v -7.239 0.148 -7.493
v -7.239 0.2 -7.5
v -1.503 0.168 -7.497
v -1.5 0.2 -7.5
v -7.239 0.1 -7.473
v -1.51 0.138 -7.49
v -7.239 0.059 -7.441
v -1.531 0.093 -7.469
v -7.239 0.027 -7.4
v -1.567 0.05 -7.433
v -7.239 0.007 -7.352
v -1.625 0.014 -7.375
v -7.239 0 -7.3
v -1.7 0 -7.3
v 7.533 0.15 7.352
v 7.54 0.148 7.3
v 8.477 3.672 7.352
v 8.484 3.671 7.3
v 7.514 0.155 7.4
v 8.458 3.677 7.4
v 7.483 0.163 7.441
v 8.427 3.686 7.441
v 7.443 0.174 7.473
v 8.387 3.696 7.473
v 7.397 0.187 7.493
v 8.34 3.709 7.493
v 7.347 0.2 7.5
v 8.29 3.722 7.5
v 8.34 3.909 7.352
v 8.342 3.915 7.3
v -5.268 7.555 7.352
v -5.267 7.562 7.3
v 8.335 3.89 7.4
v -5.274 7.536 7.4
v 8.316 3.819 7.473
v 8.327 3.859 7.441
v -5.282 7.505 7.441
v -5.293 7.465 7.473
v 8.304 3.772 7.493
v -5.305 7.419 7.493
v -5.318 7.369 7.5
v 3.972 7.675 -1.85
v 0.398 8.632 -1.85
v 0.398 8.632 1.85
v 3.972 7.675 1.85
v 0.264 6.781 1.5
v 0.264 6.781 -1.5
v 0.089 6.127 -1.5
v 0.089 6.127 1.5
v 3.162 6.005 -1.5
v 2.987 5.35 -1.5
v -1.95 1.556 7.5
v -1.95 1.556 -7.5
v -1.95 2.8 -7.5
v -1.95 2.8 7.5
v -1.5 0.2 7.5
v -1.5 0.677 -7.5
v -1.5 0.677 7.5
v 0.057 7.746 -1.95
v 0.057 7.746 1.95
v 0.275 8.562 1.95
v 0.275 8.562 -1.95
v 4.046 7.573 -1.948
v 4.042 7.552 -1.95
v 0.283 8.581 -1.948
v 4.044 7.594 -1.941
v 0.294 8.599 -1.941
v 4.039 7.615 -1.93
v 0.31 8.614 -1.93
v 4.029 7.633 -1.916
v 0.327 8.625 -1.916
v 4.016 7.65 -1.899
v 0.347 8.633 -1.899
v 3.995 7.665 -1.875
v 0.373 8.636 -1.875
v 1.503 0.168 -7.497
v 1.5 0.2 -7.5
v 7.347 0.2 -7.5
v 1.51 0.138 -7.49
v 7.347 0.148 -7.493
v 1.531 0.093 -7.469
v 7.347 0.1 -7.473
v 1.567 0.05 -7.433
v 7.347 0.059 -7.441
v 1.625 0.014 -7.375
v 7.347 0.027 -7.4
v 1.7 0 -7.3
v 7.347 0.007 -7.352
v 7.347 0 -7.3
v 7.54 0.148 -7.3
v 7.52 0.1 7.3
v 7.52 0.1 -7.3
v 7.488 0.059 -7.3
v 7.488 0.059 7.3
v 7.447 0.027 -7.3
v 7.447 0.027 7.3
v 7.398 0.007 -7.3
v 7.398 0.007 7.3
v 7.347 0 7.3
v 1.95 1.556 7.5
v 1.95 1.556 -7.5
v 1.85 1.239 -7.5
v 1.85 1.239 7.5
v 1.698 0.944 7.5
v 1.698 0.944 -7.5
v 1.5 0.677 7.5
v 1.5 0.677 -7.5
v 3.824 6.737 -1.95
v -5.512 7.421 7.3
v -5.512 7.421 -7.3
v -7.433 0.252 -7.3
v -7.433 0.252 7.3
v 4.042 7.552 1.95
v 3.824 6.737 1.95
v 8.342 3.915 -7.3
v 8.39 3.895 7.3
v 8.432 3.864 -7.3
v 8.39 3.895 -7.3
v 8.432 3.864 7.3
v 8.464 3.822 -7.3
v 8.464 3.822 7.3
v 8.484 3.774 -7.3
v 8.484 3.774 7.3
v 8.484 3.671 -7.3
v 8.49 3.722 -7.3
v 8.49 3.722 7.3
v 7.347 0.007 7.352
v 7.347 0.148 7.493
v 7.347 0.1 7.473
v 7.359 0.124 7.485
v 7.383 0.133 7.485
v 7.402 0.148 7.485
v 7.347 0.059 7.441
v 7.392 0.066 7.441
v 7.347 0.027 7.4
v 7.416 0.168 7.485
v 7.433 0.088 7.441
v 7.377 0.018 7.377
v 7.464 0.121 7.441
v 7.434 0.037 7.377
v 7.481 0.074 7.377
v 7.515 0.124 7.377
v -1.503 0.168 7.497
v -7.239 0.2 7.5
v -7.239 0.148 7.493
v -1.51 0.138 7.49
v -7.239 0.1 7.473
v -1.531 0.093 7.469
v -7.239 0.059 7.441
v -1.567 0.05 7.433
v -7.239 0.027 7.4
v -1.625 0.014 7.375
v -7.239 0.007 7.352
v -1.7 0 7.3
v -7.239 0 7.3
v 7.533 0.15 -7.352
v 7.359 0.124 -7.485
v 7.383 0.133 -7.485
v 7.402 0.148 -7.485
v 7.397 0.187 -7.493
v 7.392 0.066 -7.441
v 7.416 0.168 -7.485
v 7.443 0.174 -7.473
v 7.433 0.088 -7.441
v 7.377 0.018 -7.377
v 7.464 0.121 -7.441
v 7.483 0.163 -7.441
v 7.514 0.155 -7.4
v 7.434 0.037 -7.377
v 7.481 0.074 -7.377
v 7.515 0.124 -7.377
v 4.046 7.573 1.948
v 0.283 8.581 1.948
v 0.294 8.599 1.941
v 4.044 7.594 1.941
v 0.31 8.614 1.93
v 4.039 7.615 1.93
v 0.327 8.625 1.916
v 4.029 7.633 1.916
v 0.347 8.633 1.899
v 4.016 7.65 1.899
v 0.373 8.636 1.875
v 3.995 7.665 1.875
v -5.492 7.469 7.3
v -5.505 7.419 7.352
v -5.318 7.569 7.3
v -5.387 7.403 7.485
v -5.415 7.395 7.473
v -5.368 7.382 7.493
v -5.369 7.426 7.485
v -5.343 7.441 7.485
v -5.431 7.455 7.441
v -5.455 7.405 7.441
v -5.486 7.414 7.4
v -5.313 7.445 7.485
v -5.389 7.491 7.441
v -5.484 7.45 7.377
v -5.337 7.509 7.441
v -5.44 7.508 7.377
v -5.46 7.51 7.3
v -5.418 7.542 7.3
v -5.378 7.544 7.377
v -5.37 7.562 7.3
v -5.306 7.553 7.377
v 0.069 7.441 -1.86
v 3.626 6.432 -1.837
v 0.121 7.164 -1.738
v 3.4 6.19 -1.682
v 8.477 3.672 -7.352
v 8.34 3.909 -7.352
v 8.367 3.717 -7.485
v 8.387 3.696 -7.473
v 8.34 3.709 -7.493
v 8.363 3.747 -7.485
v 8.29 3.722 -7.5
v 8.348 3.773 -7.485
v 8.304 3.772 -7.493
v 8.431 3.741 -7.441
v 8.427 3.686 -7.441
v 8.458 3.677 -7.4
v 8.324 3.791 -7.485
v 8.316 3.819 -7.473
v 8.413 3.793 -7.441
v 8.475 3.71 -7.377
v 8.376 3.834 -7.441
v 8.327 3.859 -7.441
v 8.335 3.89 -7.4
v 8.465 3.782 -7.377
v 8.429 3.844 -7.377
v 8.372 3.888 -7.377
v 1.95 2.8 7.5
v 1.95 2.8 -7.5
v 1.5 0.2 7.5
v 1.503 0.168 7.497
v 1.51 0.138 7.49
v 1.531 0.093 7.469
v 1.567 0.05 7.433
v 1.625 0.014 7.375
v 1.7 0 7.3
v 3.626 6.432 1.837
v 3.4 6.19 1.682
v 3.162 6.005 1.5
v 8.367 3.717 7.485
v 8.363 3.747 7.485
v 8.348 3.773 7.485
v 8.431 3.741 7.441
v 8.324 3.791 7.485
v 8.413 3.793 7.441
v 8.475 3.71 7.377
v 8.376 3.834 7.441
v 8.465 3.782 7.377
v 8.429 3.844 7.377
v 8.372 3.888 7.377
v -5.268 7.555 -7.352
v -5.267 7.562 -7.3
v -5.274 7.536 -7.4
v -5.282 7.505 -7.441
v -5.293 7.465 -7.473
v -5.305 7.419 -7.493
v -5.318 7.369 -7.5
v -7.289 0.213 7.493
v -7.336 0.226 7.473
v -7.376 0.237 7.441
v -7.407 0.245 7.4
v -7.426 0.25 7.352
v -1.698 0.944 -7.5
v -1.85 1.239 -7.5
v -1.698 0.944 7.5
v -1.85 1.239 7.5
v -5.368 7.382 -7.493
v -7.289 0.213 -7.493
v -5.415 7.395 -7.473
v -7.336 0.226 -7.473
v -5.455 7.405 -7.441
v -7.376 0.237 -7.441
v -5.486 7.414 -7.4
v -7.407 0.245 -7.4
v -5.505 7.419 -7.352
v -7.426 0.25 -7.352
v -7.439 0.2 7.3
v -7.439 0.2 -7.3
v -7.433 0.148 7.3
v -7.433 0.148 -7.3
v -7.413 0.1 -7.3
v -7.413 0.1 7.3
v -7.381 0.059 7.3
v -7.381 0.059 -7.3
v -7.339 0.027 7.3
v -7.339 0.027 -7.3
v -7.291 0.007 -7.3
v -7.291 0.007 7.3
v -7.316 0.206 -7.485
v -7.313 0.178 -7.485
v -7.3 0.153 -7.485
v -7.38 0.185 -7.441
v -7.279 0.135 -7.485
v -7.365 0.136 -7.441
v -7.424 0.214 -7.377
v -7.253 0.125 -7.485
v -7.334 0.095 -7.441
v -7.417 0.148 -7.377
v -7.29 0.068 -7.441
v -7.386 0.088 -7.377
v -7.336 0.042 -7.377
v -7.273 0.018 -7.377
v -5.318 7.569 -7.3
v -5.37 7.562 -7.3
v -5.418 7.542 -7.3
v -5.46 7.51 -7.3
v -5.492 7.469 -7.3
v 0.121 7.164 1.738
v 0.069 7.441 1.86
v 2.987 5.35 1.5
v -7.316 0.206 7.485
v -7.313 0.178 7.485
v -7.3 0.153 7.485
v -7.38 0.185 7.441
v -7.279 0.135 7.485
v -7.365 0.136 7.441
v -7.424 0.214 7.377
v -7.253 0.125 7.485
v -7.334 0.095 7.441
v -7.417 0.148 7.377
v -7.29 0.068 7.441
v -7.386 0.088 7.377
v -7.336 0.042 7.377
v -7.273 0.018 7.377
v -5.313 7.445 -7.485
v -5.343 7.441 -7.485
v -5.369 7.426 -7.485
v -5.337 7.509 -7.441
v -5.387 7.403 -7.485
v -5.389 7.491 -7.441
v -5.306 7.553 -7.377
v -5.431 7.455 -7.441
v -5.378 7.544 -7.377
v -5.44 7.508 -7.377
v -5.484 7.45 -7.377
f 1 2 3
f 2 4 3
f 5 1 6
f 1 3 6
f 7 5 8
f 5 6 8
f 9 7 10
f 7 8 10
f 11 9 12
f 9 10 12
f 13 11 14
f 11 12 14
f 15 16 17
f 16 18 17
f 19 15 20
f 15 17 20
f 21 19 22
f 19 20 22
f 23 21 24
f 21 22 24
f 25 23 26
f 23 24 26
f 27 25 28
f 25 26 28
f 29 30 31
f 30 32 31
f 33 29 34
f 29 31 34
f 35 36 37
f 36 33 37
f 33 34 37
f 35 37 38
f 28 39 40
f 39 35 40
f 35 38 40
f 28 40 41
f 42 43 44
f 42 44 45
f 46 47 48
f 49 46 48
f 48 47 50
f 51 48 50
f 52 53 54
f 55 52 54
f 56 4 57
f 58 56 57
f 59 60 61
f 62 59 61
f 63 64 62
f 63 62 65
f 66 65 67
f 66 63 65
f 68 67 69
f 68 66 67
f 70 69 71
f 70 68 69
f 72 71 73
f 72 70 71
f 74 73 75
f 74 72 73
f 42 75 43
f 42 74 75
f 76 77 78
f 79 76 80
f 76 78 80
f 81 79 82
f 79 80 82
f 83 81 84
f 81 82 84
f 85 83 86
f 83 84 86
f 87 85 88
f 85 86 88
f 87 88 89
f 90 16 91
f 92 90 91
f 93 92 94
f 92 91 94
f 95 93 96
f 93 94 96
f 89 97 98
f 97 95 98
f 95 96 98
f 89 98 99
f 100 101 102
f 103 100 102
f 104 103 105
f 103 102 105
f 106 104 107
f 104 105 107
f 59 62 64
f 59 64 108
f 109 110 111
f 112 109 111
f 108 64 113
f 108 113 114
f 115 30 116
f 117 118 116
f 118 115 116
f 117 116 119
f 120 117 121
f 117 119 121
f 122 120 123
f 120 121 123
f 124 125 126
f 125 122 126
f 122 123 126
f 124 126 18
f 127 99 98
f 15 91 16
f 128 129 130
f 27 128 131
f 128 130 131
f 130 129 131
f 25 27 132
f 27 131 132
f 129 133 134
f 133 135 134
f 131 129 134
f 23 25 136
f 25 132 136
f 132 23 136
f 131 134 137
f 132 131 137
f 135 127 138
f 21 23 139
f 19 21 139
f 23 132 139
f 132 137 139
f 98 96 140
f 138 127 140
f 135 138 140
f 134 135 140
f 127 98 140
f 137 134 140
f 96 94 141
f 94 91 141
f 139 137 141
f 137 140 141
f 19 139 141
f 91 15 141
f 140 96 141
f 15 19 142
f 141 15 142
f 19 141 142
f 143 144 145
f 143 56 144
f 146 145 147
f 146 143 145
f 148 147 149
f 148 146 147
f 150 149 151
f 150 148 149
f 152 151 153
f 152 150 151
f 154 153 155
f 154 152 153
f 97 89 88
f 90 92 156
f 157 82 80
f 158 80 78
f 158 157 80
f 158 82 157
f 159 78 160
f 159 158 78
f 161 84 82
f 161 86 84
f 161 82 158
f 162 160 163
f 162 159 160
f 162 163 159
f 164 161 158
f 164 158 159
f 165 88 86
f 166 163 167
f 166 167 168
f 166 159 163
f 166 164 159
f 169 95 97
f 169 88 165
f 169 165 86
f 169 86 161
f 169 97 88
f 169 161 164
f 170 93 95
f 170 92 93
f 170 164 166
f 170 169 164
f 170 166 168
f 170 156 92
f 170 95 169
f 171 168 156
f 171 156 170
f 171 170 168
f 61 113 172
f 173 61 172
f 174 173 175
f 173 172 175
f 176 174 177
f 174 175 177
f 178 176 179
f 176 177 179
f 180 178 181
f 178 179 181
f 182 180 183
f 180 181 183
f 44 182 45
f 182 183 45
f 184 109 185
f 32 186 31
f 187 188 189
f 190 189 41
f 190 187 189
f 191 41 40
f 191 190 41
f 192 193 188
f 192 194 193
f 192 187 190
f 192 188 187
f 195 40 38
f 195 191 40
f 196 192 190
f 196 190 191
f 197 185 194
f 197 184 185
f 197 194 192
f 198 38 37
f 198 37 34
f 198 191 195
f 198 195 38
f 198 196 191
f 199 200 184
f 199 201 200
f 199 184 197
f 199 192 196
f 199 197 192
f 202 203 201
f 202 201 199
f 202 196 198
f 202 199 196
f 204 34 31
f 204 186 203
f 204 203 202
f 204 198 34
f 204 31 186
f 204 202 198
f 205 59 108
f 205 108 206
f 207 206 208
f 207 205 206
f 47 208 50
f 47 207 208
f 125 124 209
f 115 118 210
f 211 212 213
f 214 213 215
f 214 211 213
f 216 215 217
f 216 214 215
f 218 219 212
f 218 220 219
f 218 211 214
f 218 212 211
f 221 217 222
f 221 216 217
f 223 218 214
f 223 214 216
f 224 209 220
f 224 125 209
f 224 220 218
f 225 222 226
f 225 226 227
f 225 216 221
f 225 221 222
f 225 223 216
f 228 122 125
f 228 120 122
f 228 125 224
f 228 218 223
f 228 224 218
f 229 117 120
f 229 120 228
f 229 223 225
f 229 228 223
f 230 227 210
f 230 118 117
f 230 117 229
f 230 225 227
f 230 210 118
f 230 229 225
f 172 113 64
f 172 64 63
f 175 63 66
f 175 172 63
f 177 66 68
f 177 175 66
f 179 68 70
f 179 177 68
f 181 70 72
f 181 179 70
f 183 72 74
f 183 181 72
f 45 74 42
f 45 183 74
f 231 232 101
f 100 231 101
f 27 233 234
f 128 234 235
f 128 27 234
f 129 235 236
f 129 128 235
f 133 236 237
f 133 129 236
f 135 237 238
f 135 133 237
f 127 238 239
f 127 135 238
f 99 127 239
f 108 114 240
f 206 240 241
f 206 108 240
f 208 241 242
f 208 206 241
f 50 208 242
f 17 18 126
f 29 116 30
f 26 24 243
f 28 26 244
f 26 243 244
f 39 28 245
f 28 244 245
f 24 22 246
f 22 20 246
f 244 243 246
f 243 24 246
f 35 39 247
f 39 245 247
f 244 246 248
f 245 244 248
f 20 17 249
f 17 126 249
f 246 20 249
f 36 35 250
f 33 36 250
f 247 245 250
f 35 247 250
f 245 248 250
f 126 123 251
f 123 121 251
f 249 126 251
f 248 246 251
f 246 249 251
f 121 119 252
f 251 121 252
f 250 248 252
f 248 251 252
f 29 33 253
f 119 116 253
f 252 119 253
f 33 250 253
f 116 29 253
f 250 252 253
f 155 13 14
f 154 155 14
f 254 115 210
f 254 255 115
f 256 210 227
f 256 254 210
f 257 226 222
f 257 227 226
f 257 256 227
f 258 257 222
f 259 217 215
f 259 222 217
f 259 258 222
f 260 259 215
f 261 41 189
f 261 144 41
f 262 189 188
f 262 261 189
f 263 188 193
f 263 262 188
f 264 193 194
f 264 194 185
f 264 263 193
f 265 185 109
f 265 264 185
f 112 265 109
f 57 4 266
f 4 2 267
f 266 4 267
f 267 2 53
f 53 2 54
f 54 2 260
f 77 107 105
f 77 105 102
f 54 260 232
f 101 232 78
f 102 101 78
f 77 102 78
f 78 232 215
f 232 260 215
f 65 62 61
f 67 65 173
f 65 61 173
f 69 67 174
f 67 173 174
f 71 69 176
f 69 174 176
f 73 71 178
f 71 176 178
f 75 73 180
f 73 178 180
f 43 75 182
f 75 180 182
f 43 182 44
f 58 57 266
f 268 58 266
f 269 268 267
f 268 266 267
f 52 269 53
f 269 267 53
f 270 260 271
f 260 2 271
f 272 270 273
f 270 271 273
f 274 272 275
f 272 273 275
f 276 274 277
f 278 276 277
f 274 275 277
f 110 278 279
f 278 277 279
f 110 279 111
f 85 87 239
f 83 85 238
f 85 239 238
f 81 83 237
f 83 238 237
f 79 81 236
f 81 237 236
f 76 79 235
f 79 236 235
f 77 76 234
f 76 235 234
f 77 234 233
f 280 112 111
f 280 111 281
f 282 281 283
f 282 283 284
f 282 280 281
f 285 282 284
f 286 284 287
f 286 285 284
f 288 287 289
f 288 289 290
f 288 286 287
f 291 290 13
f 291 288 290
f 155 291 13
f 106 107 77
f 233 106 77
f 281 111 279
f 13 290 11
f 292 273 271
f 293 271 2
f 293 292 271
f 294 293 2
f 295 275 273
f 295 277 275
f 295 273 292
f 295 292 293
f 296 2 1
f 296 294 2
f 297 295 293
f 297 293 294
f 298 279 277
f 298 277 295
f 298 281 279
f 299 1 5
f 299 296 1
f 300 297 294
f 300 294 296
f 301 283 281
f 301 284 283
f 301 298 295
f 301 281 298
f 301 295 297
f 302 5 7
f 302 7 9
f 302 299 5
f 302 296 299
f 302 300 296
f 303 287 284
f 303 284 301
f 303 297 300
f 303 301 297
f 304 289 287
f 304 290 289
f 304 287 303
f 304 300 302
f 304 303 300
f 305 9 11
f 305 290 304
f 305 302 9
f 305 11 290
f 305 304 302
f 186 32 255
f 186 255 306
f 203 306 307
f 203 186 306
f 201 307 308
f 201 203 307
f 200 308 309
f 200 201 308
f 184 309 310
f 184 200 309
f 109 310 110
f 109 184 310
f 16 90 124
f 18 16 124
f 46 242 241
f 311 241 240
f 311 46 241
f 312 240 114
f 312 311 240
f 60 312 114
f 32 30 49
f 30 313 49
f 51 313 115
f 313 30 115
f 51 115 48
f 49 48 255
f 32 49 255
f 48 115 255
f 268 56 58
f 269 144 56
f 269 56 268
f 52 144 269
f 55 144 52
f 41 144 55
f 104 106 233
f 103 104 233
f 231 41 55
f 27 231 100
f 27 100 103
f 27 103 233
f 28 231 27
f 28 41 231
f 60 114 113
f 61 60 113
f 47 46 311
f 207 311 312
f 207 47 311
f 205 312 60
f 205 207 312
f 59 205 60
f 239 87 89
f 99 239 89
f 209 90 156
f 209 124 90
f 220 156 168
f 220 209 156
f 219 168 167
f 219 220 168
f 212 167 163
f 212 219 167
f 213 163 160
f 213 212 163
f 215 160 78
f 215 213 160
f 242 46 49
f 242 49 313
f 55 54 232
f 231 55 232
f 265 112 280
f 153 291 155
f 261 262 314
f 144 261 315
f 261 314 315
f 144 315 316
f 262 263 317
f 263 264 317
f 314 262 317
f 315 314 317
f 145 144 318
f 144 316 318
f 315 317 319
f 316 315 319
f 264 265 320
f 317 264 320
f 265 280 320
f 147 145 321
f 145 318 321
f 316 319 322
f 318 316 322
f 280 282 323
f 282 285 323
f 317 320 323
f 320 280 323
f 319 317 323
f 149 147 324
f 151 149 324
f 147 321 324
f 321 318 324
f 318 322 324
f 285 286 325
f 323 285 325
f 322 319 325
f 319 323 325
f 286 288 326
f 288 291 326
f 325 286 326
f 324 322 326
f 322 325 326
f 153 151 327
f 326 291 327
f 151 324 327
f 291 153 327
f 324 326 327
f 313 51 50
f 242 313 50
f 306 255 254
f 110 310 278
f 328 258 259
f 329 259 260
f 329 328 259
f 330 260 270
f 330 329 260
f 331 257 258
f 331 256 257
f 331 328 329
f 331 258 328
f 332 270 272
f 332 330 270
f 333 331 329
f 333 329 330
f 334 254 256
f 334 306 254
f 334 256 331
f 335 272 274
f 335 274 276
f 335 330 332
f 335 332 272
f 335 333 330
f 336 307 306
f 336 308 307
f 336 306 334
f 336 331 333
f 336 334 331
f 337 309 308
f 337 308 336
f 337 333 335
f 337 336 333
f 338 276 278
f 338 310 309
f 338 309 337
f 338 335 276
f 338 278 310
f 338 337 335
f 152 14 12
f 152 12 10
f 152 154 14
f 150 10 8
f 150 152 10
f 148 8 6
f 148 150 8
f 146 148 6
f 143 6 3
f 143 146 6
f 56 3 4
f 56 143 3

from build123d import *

# Parameters (mm, degrees)
EXTRUDE_1_DEPTH      = 7.5
EXTRUDE_1_DEPTH_BACK = 7.5
EXTRUDE_2_DEPTH      = 1.5
EXTRUDE_2_DEPTH_BACK = 1.5
EXTRUDE_3_DEPTH      = 2
EXTRUDE_3_DEPTH_BACK = 2
CUT_EXTRUDE_1_DEPTH  = 16.207955299
FILLET_1_R           = 0.2
FILLET_2_R           = 0.1


with BuildPart() as part:
    # 草图1 → 凸台-拉伸1 (new, two sides: drawn at the far end of the back side and taken through both)
    with BuildSketch(Plane.XY.offset(-EXTRUDE_1_DEPTH_BACK)):
        with BuildLine():
            Line((-7.5, 0), (-1.5, 0))
            Line((-1.5, 0), (-1.5, 0.677124344))
            ThreePointArc((-1.5, 0.677124344), (-1.780042303, 1.088161527), (-1.95, 1.555590279))
            Line((-1.95, 1.555590279), (-1.95, 2.8))
            Line((-1.95, 2.8), (1.95, 2.8))
            Line((1.95, 2.8), (1.95, 1.555590279))
            ThreePointArc((1.95, 1.555590279), (1.780042303, 1.088161527), (1.5, 0.677124344))
            Line((1.5, 0.677124344), (1.5, 0))
            Line((1.5, 0), (7.5, 0))
            Line((7.5, 0), (8.53527618, 3.863703305))
            Line((8.53527618, 3.863703305), (-5.459914348, 7.613703305))
            Line((-5.459914348, 7.613703305), (-7.5, 0))
        make_face()
    extrude(amount=EXTRUDE_1_DEPTH + EXTRUDE_1_DEPTH_BACK)

    # 草图2 → 凸台-拉伸2 (add, two sides: drawn at the far end of the back side and taken through both)
    with BuildSketch(Plane.XY.offset(-EXTRUDE_2_DEPTH_BACK)):
        Polygon((0.088792177, 6.126931873), (2.986569656, 5.350474738), (3.245388701, 6.316400564), (0.347611222, 7.092857699), align=None)
    extrude(amount=EXTRUDE_2_DEPTH + EXTRUDE_2_DEPTH_BACK)

    # 草图3 → 凸台-拉伸3 (add, two sides: drawn at the far end of the back side and taken through both)
    with BuildSketch(Plane.XY.offset(-EXTRUDE_3_DEPTH_BACK)):
        with BuildLine():
            Line((2.184728529, 8.153517871), (4.06828389, 7.648820733))
            Line((4.06828389, 7.648820733), (3.823852668, 6.736590993))
            ThreePointArc((3.823852668, 6.736590993), (3.538706676, 6.329077778), (3.161822332, 6.004526629))
            Line((3.161822332, 6.004526629), (0.264044853, 6.780983765))
            ThreePointArc((0.264044853, 6.780983765), (0.099929011, 7.250495477), (0.056741946, 7.745985269))
            Line((0.056741946, 7.745985269), (0.301173168, 8.658215009))
            Line((0.301173168, 8.658215009), (2.184728529, 8.153517871))
        make_face()
    extrude(amount=EXTRUDE_3_DEPTH + EXTRUDE_3_DEPTH_BACK)

    # 草图4 → 切除-拉伸1 (cut, through all)
    with BuildSketch(Plane(origin=(-1.883555361, 0.504697138, 0), x_dir=(0, 0, 1), z_dir=(-0.9659258262890692, 0.2588190451025178, 0))):
        with BuildLine():
            Line((1.95, 8.441142838), (2, 8.441142838))
            Line((2, 8.441142838), (2, 6.618267183))
            Line((2, 6.618267183), (1.5, 6.618267183))
            ThreePointArc((1.5, 6.618267183), (1.780042303, 7.029304366), (1.95, 7.496733117))
            Line((1.95, 7.496733117), (1.95, 8.441142838))
        make_face()
        with BuildLine():
            Line((-1.95, 8.441142838), (-1.95, 7.496733117))
            ThreePointArc((-1.95, 7.496733117), (-1.780042303, 7.029304366), (-1.5, 6.618267183))
            Line((-1.5, 6.618267183), (-2, 6.618267183))
            Line((-2, 6.618267183), (-2, 8.441142838))
            Line((-2, 8.441142838), (-1.95, 8.441142838))
        make_face()
    extrude(amount=-CUT_EXTRUDE_1_DEPTH, mode=Mode.SUBTRACT)

    # 圆角1
    fillet_1_edges = [part.edges().sort_by_distance(p)[0] for p in [
        (-5.459914348, 7.613703305, 0),
        (8.53527618, 3.863703305, 0),
        (7.5, 0, 0),
        (1.5, 0, 0),
        (-1.5, 0, 0),
        (-7.5, 0, 0),
        (4.5, 0, -7.5),
        (-6.479957174, 3.806851653, 7.5),
        (-4.5, 0, 7.5),
        (8.01763809, 1.931851653, -7.5),
        (4.5, 0, 7.5),
        (8.01763809, 1.931851653, 7.5),
        (1.537680916, 5.738703305, 7.5),
        (1.537680916, 5.738703305, -7.5),
        (-6.479957174, 3.806851653, -7.5),
        (-4.5, 0, -7.5),
    ]]
    fillet(fillet_1_edges, radius=FILLET_1_R)

    # 圆角2
    fillet_2_edges = [part.edges().sort_by_distance(p)[0] for p in [
        (4.06828389, 7.648820733, 0),
        (0.301173168, 8.658215009, 0),
        (2.184728529, 8.153517871, -1.95),
        (2.184728529, 8.153517871, 1.95),
    ]]
    fillet(fillet_2_edges, radius=FILLET_2_R)


solid = part.part
